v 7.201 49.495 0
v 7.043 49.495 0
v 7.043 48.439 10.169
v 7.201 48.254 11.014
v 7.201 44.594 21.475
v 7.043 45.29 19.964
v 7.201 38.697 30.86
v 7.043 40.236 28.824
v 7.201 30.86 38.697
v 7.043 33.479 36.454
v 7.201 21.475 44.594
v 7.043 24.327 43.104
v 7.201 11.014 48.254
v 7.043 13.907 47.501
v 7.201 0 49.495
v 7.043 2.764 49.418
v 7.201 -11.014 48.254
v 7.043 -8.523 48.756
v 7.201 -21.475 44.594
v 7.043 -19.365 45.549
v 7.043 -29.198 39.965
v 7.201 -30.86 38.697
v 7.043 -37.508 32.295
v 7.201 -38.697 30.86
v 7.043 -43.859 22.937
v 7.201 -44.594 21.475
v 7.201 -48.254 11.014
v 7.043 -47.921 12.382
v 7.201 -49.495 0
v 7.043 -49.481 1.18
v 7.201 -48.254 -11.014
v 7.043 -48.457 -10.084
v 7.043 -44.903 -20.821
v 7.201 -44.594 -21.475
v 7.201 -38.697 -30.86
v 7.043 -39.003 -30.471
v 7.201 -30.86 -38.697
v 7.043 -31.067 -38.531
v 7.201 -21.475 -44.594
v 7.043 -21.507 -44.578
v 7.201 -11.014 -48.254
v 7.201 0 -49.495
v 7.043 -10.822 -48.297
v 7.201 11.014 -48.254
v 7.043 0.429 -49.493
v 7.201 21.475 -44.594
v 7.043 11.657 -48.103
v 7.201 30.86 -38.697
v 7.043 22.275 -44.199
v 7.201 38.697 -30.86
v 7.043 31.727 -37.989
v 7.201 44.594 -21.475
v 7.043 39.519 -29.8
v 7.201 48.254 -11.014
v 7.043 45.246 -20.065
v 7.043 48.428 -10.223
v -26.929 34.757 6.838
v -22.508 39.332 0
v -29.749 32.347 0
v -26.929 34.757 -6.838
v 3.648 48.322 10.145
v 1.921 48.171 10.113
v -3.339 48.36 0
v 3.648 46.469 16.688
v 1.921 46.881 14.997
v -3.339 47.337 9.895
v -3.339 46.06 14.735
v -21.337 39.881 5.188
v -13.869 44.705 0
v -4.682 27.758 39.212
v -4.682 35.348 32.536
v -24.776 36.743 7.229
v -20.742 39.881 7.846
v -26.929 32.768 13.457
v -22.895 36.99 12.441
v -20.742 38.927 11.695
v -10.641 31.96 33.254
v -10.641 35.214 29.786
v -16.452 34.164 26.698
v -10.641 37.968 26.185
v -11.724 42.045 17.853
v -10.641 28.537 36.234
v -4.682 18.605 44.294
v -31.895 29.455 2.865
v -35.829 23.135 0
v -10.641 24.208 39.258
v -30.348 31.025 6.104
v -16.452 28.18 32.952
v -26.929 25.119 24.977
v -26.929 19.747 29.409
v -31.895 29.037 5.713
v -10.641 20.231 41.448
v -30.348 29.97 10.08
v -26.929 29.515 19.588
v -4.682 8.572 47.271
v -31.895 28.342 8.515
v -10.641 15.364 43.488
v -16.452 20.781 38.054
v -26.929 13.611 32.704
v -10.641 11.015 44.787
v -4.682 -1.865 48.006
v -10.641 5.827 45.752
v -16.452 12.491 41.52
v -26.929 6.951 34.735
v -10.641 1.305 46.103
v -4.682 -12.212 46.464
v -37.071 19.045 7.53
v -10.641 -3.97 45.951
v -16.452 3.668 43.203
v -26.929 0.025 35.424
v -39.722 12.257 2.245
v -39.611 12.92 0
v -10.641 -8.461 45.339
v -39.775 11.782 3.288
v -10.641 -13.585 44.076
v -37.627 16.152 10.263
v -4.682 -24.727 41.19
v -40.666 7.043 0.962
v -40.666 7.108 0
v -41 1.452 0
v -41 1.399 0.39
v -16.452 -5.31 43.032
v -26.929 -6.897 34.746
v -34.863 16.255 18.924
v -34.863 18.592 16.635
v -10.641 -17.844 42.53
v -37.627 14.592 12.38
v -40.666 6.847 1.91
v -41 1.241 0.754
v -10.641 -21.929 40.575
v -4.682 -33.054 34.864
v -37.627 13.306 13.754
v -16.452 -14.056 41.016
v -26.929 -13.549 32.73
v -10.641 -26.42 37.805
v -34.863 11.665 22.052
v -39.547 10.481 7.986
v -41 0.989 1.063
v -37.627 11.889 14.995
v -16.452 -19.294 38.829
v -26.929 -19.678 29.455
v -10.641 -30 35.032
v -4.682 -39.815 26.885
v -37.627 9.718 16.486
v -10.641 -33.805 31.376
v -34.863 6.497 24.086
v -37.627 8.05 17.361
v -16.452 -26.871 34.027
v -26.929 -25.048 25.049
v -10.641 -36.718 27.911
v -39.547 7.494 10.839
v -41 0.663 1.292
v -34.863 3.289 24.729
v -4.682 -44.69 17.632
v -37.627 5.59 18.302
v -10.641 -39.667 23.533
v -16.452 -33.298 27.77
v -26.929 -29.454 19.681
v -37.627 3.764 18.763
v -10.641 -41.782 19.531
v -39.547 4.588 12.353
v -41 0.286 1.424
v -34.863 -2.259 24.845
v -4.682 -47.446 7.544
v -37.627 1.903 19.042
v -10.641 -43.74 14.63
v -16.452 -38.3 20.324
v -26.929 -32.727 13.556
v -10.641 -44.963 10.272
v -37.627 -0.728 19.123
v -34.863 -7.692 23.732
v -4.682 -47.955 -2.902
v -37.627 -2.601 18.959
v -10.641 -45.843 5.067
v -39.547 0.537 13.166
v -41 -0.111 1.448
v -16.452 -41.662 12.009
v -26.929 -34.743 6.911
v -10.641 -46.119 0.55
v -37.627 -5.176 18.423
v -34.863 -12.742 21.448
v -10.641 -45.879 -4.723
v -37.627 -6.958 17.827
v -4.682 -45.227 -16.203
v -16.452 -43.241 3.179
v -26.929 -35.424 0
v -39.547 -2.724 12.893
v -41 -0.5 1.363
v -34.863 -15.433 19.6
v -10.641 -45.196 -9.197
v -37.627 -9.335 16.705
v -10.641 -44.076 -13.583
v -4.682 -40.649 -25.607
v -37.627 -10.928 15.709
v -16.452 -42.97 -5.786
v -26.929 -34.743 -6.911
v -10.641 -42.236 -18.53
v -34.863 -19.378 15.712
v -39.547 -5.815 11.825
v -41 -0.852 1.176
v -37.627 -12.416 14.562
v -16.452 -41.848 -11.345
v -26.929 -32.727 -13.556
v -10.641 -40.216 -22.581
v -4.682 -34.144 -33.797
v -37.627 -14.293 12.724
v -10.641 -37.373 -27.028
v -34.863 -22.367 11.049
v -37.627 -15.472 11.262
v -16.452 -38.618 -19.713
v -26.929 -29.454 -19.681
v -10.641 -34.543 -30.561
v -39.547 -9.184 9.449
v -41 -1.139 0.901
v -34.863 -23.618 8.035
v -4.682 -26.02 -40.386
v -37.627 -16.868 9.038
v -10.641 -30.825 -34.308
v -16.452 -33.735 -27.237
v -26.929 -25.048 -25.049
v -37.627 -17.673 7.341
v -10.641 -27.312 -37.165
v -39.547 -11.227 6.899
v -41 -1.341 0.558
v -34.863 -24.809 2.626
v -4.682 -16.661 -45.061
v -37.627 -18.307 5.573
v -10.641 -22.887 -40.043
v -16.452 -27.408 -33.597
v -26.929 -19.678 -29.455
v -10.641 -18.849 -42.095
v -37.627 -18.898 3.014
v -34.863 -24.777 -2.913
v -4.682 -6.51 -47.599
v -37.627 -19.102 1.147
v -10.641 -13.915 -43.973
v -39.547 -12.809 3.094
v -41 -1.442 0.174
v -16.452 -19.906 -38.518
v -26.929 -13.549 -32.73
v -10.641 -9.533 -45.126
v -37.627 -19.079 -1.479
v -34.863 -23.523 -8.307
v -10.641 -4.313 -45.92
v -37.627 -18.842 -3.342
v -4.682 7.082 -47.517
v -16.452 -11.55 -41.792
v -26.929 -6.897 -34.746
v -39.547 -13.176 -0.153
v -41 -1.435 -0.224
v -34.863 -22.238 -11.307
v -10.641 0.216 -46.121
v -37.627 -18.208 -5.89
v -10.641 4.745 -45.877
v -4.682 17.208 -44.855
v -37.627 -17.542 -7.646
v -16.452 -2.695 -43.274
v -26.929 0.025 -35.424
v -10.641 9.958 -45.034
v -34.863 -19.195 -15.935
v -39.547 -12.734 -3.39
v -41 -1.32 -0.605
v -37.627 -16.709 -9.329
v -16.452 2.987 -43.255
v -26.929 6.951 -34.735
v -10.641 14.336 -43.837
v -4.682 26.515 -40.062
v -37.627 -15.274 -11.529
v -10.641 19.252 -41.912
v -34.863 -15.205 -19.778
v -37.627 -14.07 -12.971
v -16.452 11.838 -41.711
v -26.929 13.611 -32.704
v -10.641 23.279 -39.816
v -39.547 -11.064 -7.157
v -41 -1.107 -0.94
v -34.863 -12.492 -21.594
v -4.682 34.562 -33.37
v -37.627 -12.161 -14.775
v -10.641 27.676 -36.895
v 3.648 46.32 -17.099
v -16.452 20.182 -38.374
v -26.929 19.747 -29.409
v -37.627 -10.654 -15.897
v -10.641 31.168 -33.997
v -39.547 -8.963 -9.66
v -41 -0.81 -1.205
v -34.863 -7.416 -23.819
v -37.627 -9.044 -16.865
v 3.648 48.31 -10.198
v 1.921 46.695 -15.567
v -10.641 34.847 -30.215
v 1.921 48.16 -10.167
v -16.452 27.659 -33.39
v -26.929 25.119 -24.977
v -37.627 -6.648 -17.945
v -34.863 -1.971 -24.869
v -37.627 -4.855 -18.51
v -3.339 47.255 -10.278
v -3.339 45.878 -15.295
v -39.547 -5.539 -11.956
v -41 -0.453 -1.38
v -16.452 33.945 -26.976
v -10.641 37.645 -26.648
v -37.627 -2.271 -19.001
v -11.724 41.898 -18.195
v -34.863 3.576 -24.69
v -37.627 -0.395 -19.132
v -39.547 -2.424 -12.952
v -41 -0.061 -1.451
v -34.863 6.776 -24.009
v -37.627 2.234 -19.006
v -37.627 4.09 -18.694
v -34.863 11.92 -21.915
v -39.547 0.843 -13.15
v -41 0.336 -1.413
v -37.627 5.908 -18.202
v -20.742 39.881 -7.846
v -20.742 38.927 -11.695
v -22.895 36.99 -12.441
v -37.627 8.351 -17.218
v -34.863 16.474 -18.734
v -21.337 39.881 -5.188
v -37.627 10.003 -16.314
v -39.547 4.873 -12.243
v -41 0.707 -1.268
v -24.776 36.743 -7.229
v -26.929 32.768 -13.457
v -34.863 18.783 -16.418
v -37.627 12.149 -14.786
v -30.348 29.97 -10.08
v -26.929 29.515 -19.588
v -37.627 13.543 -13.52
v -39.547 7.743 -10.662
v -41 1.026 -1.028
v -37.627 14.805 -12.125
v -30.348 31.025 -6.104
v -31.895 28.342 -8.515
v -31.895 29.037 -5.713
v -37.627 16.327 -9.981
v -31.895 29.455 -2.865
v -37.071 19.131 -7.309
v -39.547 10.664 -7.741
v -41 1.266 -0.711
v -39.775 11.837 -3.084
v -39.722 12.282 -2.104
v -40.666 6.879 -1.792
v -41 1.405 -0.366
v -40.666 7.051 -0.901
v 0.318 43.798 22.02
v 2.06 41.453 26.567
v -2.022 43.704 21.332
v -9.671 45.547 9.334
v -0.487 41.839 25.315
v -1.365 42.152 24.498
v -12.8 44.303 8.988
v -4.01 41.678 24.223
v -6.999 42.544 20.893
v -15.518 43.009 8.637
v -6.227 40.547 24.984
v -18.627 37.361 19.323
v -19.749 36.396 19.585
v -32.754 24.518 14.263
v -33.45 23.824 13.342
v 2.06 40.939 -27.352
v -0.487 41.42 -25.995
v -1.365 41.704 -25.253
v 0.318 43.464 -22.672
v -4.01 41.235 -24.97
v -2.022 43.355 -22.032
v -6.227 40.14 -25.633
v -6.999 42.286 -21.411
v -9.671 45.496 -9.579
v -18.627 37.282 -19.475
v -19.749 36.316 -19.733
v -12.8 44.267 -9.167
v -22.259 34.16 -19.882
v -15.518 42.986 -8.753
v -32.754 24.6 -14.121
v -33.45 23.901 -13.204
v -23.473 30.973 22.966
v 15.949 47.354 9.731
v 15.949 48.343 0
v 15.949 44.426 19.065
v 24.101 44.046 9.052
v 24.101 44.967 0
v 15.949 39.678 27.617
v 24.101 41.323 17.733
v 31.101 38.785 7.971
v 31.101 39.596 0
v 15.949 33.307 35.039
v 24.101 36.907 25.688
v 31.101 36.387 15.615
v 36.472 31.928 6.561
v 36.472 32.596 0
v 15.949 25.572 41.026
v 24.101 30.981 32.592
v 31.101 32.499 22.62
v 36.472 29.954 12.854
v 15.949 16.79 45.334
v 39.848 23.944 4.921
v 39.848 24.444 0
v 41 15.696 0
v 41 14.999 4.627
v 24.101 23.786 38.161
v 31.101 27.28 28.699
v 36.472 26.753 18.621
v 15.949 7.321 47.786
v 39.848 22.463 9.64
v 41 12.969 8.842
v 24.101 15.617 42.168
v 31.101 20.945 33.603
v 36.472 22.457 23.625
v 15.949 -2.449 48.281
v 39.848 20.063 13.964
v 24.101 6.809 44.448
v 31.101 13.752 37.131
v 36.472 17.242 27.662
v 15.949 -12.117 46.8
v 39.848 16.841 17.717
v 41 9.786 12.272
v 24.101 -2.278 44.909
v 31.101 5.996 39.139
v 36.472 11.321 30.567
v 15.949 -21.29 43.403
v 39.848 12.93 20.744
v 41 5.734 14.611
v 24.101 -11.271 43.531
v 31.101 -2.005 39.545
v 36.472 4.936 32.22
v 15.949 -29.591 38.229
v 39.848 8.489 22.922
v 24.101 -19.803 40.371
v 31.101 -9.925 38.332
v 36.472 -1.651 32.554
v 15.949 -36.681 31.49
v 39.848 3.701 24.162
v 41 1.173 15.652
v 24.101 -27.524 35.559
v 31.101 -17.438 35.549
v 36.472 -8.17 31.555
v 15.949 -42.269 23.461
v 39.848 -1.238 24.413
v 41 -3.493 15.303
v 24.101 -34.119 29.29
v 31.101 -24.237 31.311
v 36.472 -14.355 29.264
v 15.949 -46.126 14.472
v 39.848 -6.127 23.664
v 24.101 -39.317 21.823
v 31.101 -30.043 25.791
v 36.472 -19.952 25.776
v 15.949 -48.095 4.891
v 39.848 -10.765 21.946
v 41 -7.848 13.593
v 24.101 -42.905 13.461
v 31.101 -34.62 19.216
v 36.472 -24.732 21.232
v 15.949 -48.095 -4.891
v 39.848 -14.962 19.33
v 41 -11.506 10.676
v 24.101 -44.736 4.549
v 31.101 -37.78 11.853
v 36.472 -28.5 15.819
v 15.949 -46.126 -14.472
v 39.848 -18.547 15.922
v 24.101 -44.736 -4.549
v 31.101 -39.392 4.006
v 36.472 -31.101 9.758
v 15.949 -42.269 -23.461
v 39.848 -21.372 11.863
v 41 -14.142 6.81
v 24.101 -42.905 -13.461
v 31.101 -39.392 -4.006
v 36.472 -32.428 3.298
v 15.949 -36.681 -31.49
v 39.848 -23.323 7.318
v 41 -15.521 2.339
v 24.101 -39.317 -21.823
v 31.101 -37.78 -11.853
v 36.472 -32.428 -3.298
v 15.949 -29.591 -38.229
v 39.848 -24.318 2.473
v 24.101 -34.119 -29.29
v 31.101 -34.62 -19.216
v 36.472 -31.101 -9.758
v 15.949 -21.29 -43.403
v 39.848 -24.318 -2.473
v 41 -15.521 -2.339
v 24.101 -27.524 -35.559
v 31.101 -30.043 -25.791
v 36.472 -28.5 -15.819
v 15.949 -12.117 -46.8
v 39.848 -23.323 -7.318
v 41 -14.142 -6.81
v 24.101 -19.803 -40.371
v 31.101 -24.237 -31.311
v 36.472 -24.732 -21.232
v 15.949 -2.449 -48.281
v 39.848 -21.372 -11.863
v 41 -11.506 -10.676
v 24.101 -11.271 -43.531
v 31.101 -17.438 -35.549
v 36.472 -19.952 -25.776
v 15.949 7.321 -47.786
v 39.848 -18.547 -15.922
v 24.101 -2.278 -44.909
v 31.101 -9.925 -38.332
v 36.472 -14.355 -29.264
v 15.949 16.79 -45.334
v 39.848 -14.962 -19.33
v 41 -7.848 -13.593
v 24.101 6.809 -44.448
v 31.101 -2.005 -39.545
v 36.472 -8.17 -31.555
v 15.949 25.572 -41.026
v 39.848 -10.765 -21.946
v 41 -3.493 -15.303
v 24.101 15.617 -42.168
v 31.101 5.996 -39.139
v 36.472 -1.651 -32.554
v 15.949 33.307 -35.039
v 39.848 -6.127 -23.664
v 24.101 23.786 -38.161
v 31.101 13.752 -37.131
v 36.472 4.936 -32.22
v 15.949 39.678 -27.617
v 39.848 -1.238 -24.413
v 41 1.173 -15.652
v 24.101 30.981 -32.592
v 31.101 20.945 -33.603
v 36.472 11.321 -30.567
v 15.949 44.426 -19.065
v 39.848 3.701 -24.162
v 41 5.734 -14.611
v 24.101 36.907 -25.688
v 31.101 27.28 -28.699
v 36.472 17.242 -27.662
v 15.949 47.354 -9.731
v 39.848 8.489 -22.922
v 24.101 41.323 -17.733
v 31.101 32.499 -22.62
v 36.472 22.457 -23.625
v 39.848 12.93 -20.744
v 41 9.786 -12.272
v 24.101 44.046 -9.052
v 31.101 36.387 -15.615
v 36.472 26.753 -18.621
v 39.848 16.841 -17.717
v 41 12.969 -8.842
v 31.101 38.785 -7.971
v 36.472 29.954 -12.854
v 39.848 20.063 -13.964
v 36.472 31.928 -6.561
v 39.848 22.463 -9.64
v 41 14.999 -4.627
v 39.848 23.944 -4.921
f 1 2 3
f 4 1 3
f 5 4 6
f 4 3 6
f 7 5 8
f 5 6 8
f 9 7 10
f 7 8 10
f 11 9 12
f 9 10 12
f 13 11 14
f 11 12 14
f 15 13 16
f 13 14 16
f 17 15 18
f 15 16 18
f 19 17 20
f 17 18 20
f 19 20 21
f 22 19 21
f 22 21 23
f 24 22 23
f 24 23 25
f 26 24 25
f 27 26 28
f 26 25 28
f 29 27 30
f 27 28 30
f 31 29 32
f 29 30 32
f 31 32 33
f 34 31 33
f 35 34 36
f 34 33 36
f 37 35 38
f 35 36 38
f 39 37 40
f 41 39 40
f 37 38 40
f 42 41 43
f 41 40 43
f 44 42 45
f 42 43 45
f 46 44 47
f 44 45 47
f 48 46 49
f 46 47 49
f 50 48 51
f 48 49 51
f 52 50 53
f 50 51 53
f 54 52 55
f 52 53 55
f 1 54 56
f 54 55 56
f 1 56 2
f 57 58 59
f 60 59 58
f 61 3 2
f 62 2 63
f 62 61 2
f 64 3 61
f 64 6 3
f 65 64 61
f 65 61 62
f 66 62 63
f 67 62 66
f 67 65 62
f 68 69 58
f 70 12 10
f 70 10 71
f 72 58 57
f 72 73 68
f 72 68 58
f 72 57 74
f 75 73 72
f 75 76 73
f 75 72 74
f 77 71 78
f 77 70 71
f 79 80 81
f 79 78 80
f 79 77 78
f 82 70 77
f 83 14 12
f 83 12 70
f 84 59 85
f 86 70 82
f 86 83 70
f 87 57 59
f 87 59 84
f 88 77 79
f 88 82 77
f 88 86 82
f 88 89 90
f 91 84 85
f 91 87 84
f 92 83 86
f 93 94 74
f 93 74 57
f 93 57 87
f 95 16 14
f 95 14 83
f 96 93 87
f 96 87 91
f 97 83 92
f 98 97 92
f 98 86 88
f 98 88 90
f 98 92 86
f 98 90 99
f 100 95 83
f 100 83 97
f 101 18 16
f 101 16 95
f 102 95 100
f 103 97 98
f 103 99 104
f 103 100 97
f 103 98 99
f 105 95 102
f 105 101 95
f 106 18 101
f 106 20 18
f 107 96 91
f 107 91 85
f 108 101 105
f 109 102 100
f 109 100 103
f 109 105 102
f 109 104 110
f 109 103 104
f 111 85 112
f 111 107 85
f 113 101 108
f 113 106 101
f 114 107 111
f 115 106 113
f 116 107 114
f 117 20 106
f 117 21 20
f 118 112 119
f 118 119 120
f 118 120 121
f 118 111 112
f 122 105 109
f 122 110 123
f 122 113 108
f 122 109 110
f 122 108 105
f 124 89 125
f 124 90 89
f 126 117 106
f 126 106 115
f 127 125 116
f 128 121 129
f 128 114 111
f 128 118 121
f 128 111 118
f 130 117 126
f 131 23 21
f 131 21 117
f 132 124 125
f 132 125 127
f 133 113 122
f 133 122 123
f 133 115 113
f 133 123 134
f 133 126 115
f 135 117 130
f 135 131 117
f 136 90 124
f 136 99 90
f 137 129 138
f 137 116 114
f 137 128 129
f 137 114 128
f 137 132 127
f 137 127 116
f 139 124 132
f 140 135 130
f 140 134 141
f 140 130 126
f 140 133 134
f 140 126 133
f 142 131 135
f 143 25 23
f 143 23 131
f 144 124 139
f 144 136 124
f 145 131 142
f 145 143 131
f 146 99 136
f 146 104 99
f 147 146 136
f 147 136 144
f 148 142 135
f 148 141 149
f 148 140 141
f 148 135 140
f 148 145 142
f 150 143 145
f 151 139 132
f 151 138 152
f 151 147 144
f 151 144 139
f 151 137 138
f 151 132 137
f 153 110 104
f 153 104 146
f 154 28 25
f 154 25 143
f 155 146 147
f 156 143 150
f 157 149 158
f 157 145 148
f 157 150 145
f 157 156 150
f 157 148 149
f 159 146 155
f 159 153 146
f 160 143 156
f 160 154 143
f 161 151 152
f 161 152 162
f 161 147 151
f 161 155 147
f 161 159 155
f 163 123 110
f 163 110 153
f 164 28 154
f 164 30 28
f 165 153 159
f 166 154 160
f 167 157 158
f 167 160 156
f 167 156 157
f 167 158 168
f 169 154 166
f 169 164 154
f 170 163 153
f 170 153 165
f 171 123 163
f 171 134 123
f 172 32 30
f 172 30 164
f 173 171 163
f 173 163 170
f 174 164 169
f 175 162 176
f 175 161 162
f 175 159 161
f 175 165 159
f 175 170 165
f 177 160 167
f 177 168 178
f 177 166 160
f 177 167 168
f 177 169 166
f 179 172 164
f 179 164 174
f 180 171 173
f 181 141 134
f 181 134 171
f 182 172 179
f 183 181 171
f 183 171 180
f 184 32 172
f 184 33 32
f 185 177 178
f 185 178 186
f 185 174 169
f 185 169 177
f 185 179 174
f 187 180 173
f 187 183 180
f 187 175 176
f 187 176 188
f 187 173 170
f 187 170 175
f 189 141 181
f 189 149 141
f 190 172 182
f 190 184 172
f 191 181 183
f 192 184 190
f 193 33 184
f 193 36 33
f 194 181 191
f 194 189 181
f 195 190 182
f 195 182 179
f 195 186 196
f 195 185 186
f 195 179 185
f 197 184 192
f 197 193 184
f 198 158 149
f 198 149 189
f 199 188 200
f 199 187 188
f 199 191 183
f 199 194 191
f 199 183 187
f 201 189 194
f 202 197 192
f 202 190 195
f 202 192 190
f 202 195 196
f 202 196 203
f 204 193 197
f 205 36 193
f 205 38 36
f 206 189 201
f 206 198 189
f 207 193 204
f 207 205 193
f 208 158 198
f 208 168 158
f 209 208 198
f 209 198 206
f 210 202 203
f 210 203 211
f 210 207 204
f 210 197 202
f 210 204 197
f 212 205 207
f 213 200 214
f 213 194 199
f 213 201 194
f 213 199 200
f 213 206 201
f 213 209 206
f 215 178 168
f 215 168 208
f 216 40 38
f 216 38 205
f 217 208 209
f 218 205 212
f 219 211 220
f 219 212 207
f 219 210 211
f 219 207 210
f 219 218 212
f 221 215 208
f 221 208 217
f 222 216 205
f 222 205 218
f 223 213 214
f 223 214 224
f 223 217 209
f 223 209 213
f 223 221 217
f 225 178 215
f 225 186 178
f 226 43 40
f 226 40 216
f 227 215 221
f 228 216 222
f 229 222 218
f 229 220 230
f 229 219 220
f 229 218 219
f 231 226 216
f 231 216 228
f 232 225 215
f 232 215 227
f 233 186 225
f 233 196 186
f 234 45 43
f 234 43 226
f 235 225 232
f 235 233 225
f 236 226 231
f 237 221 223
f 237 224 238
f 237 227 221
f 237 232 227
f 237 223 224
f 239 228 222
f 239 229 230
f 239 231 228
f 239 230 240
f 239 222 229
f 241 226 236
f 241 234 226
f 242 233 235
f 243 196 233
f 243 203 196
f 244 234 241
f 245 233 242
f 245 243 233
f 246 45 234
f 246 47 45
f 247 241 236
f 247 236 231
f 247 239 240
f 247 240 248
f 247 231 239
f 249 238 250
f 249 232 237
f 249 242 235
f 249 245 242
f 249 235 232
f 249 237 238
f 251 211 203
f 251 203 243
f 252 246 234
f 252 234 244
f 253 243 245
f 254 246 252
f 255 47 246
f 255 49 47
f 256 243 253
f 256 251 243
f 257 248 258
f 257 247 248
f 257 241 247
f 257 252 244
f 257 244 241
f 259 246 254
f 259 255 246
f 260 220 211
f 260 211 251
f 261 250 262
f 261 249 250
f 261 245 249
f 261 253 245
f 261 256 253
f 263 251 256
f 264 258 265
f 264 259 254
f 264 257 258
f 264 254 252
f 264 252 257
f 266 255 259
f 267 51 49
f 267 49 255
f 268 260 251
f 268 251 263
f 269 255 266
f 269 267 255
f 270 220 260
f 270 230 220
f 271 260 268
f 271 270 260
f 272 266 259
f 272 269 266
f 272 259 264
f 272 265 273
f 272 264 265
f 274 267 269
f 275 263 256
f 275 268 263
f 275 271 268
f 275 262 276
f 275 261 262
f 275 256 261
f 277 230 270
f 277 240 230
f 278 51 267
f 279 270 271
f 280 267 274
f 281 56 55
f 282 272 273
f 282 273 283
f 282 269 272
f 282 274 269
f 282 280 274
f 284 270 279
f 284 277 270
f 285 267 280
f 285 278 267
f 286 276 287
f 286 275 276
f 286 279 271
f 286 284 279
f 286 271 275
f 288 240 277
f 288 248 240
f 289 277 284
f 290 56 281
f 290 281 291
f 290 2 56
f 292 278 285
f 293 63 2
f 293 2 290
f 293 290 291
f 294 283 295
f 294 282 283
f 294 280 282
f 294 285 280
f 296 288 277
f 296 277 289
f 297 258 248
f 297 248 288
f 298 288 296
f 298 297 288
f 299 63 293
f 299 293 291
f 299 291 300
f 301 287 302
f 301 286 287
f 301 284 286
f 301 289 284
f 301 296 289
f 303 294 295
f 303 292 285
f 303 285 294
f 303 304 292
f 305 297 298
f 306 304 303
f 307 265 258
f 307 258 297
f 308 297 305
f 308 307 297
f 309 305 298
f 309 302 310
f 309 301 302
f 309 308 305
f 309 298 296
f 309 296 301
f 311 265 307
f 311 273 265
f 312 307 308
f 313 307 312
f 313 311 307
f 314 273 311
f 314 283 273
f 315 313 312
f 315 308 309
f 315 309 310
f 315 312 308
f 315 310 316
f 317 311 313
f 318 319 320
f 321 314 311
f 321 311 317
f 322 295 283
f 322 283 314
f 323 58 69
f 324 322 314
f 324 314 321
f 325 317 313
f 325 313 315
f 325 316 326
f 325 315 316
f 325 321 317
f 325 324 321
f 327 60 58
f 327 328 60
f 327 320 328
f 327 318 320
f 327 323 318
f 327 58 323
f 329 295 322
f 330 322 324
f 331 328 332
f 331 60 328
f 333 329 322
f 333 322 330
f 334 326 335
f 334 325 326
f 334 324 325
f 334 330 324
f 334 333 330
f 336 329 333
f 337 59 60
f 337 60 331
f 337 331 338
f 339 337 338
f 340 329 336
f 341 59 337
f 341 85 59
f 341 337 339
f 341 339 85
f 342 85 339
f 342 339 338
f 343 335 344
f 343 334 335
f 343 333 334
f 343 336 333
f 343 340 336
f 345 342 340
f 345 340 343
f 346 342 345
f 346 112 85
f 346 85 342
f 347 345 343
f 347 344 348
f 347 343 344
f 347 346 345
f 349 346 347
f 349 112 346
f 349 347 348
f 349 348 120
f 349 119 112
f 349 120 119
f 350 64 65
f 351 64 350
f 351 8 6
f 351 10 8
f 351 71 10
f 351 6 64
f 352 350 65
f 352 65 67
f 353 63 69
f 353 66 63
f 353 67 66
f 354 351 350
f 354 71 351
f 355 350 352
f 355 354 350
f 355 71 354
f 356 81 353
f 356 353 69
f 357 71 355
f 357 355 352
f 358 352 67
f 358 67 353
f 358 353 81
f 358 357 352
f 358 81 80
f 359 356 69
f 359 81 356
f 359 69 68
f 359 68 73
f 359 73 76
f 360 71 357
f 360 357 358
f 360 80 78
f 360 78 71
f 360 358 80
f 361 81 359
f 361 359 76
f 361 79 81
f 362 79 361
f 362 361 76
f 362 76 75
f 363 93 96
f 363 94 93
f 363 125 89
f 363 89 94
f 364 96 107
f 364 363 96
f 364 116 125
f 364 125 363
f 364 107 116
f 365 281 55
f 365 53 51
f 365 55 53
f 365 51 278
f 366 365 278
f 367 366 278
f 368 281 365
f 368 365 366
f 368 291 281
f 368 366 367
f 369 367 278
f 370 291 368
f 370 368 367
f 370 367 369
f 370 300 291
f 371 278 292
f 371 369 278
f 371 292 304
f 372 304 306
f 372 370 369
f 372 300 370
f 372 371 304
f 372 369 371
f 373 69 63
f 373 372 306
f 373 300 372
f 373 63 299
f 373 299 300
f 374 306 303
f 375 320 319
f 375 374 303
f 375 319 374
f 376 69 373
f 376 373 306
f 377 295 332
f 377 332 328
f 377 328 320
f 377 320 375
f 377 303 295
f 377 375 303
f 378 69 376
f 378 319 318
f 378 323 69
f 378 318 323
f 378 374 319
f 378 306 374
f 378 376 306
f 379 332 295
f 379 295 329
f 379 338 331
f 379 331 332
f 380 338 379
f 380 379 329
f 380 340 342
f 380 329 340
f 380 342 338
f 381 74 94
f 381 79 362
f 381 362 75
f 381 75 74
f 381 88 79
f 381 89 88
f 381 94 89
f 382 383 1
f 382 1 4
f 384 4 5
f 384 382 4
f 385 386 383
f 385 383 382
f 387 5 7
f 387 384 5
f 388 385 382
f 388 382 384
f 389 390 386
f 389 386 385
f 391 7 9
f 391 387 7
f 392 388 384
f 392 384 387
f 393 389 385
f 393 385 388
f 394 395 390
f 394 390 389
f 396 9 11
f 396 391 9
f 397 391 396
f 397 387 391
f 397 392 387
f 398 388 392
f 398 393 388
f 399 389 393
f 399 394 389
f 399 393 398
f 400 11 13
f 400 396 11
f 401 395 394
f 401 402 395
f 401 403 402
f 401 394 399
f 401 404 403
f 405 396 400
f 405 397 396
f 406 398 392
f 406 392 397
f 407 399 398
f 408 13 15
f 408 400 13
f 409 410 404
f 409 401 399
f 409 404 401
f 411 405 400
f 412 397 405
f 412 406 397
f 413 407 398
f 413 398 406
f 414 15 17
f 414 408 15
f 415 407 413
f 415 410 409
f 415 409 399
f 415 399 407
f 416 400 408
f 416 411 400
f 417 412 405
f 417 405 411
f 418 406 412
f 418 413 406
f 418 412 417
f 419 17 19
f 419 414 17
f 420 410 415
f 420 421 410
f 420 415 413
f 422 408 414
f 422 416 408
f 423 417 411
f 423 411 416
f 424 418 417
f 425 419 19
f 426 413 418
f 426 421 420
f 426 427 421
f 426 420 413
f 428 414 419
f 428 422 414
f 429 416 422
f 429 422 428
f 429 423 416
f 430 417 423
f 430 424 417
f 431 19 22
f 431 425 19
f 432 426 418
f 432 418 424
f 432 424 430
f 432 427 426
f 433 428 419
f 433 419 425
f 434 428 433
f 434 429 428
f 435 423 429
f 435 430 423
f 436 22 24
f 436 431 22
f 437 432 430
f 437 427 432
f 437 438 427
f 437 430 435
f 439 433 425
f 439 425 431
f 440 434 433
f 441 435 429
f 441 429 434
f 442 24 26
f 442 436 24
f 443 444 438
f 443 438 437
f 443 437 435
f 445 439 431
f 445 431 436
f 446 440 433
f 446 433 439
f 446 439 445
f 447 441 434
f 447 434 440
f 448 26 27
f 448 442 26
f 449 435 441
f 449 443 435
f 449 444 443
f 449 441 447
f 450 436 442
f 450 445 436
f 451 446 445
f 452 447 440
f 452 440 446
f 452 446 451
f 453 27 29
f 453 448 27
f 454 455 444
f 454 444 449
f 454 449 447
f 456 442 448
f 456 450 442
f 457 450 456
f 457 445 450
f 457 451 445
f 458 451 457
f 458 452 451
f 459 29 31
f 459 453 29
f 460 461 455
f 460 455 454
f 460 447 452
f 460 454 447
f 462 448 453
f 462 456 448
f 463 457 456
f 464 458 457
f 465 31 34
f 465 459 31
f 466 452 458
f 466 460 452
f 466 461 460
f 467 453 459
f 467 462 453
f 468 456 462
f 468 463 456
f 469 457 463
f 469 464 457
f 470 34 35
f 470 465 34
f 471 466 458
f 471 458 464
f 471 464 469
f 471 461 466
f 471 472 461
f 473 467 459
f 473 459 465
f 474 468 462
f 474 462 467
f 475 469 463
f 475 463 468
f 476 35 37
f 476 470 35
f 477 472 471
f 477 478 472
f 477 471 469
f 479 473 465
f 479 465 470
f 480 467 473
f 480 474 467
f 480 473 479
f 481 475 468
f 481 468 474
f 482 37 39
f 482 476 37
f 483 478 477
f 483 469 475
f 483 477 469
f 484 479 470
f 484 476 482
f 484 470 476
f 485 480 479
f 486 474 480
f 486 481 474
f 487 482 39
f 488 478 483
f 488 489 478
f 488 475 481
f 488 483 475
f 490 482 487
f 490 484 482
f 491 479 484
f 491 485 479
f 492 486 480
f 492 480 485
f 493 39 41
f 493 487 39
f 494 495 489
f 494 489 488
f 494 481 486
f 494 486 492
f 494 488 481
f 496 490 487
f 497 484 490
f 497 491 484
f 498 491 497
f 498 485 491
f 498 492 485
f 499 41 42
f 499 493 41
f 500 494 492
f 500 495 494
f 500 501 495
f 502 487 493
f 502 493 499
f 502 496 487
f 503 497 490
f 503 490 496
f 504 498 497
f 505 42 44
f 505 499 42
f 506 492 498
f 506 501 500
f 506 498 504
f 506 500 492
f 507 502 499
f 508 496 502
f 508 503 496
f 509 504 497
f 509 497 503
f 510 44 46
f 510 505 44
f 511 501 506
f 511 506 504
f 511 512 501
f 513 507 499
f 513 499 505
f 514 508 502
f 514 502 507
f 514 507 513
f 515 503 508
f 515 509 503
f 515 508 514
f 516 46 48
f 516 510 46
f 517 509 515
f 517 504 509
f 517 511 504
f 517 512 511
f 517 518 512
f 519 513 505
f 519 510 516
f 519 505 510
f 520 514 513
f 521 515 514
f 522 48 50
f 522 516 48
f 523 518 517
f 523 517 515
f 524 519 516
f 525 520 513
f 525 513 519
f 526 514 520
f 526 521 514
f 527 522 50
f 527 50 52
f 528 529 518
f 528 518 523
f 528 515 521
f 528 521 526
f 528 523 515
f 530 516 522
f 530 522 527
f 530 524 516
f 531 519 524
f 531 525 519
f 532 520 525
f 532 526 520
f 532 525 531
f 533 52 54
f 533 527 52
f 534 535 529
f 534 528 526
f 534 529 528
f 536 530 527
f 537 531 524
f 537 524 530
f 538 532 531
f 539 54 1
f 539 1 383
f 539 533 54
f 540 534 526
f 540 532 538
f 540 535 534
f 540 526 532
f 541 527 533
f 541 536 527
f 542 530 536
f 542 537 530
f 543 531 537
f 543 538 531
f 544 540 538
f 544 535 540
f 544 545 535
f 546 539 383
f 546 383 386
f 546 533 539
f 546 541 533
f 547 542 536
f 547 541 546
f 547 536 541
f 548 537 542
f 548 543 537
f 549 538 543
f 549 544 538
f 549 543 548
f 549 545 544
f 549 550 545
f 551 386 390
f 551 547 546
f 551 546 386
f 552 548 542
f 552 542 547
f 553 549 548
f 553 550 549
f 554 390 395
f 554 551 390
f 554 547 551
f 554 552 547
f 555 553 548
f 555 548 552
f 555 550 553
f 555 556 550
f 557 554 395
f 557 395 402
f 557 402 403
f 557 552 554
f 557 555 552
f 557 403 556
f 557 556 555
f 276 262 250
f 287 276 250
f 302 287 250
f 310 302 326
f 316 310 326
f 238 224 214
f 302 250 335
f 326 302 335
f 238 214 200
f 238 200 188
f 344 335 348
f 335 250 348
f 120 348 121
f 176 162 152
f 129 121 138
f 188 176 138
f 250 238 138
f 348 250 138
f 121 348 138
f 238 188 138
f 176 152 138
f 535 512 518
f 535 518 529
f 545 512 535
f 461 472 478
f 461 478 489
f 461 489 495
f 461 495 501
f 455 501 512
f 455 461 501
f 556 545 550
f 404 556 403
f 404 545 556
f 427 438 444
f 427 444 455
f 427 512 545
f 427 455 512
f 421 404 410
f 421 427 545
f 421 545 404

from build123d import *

# Parameters (mm, degrees)
F0_R          = 49.4950717009
F1_DEPTH      = 41
F1_DEPTH_BACK = 41
F2_R          = 48.0428498912
F3_R          = 33.7989898732


with BuildPart() as f1:
    # F0 (on Right) → F1 (new body, two sides)
    with BuildSketch(Plane.YZ) as f1_sk:
        Circle(F0_R)
    extrude(amount=-F1_DEPTH)
    extrude(f1_sk.sketch, amount=F1_DEPTH_BACK)

    # F2
    f2_edges = [f1.edges().sort_by_distance(p)[0] for p in [
        (-41, -49.495072, 0),
    ]]
    fillet(f2_edges, radius=F2_R)

    # F3
    f3_edges = [f1.edges().sort_by_distance(p)[0] for p in [
        (41, -49.495072, 0),
    ]]
    fillet(f3_edges, radius=F3_R)


solid = f1.part
